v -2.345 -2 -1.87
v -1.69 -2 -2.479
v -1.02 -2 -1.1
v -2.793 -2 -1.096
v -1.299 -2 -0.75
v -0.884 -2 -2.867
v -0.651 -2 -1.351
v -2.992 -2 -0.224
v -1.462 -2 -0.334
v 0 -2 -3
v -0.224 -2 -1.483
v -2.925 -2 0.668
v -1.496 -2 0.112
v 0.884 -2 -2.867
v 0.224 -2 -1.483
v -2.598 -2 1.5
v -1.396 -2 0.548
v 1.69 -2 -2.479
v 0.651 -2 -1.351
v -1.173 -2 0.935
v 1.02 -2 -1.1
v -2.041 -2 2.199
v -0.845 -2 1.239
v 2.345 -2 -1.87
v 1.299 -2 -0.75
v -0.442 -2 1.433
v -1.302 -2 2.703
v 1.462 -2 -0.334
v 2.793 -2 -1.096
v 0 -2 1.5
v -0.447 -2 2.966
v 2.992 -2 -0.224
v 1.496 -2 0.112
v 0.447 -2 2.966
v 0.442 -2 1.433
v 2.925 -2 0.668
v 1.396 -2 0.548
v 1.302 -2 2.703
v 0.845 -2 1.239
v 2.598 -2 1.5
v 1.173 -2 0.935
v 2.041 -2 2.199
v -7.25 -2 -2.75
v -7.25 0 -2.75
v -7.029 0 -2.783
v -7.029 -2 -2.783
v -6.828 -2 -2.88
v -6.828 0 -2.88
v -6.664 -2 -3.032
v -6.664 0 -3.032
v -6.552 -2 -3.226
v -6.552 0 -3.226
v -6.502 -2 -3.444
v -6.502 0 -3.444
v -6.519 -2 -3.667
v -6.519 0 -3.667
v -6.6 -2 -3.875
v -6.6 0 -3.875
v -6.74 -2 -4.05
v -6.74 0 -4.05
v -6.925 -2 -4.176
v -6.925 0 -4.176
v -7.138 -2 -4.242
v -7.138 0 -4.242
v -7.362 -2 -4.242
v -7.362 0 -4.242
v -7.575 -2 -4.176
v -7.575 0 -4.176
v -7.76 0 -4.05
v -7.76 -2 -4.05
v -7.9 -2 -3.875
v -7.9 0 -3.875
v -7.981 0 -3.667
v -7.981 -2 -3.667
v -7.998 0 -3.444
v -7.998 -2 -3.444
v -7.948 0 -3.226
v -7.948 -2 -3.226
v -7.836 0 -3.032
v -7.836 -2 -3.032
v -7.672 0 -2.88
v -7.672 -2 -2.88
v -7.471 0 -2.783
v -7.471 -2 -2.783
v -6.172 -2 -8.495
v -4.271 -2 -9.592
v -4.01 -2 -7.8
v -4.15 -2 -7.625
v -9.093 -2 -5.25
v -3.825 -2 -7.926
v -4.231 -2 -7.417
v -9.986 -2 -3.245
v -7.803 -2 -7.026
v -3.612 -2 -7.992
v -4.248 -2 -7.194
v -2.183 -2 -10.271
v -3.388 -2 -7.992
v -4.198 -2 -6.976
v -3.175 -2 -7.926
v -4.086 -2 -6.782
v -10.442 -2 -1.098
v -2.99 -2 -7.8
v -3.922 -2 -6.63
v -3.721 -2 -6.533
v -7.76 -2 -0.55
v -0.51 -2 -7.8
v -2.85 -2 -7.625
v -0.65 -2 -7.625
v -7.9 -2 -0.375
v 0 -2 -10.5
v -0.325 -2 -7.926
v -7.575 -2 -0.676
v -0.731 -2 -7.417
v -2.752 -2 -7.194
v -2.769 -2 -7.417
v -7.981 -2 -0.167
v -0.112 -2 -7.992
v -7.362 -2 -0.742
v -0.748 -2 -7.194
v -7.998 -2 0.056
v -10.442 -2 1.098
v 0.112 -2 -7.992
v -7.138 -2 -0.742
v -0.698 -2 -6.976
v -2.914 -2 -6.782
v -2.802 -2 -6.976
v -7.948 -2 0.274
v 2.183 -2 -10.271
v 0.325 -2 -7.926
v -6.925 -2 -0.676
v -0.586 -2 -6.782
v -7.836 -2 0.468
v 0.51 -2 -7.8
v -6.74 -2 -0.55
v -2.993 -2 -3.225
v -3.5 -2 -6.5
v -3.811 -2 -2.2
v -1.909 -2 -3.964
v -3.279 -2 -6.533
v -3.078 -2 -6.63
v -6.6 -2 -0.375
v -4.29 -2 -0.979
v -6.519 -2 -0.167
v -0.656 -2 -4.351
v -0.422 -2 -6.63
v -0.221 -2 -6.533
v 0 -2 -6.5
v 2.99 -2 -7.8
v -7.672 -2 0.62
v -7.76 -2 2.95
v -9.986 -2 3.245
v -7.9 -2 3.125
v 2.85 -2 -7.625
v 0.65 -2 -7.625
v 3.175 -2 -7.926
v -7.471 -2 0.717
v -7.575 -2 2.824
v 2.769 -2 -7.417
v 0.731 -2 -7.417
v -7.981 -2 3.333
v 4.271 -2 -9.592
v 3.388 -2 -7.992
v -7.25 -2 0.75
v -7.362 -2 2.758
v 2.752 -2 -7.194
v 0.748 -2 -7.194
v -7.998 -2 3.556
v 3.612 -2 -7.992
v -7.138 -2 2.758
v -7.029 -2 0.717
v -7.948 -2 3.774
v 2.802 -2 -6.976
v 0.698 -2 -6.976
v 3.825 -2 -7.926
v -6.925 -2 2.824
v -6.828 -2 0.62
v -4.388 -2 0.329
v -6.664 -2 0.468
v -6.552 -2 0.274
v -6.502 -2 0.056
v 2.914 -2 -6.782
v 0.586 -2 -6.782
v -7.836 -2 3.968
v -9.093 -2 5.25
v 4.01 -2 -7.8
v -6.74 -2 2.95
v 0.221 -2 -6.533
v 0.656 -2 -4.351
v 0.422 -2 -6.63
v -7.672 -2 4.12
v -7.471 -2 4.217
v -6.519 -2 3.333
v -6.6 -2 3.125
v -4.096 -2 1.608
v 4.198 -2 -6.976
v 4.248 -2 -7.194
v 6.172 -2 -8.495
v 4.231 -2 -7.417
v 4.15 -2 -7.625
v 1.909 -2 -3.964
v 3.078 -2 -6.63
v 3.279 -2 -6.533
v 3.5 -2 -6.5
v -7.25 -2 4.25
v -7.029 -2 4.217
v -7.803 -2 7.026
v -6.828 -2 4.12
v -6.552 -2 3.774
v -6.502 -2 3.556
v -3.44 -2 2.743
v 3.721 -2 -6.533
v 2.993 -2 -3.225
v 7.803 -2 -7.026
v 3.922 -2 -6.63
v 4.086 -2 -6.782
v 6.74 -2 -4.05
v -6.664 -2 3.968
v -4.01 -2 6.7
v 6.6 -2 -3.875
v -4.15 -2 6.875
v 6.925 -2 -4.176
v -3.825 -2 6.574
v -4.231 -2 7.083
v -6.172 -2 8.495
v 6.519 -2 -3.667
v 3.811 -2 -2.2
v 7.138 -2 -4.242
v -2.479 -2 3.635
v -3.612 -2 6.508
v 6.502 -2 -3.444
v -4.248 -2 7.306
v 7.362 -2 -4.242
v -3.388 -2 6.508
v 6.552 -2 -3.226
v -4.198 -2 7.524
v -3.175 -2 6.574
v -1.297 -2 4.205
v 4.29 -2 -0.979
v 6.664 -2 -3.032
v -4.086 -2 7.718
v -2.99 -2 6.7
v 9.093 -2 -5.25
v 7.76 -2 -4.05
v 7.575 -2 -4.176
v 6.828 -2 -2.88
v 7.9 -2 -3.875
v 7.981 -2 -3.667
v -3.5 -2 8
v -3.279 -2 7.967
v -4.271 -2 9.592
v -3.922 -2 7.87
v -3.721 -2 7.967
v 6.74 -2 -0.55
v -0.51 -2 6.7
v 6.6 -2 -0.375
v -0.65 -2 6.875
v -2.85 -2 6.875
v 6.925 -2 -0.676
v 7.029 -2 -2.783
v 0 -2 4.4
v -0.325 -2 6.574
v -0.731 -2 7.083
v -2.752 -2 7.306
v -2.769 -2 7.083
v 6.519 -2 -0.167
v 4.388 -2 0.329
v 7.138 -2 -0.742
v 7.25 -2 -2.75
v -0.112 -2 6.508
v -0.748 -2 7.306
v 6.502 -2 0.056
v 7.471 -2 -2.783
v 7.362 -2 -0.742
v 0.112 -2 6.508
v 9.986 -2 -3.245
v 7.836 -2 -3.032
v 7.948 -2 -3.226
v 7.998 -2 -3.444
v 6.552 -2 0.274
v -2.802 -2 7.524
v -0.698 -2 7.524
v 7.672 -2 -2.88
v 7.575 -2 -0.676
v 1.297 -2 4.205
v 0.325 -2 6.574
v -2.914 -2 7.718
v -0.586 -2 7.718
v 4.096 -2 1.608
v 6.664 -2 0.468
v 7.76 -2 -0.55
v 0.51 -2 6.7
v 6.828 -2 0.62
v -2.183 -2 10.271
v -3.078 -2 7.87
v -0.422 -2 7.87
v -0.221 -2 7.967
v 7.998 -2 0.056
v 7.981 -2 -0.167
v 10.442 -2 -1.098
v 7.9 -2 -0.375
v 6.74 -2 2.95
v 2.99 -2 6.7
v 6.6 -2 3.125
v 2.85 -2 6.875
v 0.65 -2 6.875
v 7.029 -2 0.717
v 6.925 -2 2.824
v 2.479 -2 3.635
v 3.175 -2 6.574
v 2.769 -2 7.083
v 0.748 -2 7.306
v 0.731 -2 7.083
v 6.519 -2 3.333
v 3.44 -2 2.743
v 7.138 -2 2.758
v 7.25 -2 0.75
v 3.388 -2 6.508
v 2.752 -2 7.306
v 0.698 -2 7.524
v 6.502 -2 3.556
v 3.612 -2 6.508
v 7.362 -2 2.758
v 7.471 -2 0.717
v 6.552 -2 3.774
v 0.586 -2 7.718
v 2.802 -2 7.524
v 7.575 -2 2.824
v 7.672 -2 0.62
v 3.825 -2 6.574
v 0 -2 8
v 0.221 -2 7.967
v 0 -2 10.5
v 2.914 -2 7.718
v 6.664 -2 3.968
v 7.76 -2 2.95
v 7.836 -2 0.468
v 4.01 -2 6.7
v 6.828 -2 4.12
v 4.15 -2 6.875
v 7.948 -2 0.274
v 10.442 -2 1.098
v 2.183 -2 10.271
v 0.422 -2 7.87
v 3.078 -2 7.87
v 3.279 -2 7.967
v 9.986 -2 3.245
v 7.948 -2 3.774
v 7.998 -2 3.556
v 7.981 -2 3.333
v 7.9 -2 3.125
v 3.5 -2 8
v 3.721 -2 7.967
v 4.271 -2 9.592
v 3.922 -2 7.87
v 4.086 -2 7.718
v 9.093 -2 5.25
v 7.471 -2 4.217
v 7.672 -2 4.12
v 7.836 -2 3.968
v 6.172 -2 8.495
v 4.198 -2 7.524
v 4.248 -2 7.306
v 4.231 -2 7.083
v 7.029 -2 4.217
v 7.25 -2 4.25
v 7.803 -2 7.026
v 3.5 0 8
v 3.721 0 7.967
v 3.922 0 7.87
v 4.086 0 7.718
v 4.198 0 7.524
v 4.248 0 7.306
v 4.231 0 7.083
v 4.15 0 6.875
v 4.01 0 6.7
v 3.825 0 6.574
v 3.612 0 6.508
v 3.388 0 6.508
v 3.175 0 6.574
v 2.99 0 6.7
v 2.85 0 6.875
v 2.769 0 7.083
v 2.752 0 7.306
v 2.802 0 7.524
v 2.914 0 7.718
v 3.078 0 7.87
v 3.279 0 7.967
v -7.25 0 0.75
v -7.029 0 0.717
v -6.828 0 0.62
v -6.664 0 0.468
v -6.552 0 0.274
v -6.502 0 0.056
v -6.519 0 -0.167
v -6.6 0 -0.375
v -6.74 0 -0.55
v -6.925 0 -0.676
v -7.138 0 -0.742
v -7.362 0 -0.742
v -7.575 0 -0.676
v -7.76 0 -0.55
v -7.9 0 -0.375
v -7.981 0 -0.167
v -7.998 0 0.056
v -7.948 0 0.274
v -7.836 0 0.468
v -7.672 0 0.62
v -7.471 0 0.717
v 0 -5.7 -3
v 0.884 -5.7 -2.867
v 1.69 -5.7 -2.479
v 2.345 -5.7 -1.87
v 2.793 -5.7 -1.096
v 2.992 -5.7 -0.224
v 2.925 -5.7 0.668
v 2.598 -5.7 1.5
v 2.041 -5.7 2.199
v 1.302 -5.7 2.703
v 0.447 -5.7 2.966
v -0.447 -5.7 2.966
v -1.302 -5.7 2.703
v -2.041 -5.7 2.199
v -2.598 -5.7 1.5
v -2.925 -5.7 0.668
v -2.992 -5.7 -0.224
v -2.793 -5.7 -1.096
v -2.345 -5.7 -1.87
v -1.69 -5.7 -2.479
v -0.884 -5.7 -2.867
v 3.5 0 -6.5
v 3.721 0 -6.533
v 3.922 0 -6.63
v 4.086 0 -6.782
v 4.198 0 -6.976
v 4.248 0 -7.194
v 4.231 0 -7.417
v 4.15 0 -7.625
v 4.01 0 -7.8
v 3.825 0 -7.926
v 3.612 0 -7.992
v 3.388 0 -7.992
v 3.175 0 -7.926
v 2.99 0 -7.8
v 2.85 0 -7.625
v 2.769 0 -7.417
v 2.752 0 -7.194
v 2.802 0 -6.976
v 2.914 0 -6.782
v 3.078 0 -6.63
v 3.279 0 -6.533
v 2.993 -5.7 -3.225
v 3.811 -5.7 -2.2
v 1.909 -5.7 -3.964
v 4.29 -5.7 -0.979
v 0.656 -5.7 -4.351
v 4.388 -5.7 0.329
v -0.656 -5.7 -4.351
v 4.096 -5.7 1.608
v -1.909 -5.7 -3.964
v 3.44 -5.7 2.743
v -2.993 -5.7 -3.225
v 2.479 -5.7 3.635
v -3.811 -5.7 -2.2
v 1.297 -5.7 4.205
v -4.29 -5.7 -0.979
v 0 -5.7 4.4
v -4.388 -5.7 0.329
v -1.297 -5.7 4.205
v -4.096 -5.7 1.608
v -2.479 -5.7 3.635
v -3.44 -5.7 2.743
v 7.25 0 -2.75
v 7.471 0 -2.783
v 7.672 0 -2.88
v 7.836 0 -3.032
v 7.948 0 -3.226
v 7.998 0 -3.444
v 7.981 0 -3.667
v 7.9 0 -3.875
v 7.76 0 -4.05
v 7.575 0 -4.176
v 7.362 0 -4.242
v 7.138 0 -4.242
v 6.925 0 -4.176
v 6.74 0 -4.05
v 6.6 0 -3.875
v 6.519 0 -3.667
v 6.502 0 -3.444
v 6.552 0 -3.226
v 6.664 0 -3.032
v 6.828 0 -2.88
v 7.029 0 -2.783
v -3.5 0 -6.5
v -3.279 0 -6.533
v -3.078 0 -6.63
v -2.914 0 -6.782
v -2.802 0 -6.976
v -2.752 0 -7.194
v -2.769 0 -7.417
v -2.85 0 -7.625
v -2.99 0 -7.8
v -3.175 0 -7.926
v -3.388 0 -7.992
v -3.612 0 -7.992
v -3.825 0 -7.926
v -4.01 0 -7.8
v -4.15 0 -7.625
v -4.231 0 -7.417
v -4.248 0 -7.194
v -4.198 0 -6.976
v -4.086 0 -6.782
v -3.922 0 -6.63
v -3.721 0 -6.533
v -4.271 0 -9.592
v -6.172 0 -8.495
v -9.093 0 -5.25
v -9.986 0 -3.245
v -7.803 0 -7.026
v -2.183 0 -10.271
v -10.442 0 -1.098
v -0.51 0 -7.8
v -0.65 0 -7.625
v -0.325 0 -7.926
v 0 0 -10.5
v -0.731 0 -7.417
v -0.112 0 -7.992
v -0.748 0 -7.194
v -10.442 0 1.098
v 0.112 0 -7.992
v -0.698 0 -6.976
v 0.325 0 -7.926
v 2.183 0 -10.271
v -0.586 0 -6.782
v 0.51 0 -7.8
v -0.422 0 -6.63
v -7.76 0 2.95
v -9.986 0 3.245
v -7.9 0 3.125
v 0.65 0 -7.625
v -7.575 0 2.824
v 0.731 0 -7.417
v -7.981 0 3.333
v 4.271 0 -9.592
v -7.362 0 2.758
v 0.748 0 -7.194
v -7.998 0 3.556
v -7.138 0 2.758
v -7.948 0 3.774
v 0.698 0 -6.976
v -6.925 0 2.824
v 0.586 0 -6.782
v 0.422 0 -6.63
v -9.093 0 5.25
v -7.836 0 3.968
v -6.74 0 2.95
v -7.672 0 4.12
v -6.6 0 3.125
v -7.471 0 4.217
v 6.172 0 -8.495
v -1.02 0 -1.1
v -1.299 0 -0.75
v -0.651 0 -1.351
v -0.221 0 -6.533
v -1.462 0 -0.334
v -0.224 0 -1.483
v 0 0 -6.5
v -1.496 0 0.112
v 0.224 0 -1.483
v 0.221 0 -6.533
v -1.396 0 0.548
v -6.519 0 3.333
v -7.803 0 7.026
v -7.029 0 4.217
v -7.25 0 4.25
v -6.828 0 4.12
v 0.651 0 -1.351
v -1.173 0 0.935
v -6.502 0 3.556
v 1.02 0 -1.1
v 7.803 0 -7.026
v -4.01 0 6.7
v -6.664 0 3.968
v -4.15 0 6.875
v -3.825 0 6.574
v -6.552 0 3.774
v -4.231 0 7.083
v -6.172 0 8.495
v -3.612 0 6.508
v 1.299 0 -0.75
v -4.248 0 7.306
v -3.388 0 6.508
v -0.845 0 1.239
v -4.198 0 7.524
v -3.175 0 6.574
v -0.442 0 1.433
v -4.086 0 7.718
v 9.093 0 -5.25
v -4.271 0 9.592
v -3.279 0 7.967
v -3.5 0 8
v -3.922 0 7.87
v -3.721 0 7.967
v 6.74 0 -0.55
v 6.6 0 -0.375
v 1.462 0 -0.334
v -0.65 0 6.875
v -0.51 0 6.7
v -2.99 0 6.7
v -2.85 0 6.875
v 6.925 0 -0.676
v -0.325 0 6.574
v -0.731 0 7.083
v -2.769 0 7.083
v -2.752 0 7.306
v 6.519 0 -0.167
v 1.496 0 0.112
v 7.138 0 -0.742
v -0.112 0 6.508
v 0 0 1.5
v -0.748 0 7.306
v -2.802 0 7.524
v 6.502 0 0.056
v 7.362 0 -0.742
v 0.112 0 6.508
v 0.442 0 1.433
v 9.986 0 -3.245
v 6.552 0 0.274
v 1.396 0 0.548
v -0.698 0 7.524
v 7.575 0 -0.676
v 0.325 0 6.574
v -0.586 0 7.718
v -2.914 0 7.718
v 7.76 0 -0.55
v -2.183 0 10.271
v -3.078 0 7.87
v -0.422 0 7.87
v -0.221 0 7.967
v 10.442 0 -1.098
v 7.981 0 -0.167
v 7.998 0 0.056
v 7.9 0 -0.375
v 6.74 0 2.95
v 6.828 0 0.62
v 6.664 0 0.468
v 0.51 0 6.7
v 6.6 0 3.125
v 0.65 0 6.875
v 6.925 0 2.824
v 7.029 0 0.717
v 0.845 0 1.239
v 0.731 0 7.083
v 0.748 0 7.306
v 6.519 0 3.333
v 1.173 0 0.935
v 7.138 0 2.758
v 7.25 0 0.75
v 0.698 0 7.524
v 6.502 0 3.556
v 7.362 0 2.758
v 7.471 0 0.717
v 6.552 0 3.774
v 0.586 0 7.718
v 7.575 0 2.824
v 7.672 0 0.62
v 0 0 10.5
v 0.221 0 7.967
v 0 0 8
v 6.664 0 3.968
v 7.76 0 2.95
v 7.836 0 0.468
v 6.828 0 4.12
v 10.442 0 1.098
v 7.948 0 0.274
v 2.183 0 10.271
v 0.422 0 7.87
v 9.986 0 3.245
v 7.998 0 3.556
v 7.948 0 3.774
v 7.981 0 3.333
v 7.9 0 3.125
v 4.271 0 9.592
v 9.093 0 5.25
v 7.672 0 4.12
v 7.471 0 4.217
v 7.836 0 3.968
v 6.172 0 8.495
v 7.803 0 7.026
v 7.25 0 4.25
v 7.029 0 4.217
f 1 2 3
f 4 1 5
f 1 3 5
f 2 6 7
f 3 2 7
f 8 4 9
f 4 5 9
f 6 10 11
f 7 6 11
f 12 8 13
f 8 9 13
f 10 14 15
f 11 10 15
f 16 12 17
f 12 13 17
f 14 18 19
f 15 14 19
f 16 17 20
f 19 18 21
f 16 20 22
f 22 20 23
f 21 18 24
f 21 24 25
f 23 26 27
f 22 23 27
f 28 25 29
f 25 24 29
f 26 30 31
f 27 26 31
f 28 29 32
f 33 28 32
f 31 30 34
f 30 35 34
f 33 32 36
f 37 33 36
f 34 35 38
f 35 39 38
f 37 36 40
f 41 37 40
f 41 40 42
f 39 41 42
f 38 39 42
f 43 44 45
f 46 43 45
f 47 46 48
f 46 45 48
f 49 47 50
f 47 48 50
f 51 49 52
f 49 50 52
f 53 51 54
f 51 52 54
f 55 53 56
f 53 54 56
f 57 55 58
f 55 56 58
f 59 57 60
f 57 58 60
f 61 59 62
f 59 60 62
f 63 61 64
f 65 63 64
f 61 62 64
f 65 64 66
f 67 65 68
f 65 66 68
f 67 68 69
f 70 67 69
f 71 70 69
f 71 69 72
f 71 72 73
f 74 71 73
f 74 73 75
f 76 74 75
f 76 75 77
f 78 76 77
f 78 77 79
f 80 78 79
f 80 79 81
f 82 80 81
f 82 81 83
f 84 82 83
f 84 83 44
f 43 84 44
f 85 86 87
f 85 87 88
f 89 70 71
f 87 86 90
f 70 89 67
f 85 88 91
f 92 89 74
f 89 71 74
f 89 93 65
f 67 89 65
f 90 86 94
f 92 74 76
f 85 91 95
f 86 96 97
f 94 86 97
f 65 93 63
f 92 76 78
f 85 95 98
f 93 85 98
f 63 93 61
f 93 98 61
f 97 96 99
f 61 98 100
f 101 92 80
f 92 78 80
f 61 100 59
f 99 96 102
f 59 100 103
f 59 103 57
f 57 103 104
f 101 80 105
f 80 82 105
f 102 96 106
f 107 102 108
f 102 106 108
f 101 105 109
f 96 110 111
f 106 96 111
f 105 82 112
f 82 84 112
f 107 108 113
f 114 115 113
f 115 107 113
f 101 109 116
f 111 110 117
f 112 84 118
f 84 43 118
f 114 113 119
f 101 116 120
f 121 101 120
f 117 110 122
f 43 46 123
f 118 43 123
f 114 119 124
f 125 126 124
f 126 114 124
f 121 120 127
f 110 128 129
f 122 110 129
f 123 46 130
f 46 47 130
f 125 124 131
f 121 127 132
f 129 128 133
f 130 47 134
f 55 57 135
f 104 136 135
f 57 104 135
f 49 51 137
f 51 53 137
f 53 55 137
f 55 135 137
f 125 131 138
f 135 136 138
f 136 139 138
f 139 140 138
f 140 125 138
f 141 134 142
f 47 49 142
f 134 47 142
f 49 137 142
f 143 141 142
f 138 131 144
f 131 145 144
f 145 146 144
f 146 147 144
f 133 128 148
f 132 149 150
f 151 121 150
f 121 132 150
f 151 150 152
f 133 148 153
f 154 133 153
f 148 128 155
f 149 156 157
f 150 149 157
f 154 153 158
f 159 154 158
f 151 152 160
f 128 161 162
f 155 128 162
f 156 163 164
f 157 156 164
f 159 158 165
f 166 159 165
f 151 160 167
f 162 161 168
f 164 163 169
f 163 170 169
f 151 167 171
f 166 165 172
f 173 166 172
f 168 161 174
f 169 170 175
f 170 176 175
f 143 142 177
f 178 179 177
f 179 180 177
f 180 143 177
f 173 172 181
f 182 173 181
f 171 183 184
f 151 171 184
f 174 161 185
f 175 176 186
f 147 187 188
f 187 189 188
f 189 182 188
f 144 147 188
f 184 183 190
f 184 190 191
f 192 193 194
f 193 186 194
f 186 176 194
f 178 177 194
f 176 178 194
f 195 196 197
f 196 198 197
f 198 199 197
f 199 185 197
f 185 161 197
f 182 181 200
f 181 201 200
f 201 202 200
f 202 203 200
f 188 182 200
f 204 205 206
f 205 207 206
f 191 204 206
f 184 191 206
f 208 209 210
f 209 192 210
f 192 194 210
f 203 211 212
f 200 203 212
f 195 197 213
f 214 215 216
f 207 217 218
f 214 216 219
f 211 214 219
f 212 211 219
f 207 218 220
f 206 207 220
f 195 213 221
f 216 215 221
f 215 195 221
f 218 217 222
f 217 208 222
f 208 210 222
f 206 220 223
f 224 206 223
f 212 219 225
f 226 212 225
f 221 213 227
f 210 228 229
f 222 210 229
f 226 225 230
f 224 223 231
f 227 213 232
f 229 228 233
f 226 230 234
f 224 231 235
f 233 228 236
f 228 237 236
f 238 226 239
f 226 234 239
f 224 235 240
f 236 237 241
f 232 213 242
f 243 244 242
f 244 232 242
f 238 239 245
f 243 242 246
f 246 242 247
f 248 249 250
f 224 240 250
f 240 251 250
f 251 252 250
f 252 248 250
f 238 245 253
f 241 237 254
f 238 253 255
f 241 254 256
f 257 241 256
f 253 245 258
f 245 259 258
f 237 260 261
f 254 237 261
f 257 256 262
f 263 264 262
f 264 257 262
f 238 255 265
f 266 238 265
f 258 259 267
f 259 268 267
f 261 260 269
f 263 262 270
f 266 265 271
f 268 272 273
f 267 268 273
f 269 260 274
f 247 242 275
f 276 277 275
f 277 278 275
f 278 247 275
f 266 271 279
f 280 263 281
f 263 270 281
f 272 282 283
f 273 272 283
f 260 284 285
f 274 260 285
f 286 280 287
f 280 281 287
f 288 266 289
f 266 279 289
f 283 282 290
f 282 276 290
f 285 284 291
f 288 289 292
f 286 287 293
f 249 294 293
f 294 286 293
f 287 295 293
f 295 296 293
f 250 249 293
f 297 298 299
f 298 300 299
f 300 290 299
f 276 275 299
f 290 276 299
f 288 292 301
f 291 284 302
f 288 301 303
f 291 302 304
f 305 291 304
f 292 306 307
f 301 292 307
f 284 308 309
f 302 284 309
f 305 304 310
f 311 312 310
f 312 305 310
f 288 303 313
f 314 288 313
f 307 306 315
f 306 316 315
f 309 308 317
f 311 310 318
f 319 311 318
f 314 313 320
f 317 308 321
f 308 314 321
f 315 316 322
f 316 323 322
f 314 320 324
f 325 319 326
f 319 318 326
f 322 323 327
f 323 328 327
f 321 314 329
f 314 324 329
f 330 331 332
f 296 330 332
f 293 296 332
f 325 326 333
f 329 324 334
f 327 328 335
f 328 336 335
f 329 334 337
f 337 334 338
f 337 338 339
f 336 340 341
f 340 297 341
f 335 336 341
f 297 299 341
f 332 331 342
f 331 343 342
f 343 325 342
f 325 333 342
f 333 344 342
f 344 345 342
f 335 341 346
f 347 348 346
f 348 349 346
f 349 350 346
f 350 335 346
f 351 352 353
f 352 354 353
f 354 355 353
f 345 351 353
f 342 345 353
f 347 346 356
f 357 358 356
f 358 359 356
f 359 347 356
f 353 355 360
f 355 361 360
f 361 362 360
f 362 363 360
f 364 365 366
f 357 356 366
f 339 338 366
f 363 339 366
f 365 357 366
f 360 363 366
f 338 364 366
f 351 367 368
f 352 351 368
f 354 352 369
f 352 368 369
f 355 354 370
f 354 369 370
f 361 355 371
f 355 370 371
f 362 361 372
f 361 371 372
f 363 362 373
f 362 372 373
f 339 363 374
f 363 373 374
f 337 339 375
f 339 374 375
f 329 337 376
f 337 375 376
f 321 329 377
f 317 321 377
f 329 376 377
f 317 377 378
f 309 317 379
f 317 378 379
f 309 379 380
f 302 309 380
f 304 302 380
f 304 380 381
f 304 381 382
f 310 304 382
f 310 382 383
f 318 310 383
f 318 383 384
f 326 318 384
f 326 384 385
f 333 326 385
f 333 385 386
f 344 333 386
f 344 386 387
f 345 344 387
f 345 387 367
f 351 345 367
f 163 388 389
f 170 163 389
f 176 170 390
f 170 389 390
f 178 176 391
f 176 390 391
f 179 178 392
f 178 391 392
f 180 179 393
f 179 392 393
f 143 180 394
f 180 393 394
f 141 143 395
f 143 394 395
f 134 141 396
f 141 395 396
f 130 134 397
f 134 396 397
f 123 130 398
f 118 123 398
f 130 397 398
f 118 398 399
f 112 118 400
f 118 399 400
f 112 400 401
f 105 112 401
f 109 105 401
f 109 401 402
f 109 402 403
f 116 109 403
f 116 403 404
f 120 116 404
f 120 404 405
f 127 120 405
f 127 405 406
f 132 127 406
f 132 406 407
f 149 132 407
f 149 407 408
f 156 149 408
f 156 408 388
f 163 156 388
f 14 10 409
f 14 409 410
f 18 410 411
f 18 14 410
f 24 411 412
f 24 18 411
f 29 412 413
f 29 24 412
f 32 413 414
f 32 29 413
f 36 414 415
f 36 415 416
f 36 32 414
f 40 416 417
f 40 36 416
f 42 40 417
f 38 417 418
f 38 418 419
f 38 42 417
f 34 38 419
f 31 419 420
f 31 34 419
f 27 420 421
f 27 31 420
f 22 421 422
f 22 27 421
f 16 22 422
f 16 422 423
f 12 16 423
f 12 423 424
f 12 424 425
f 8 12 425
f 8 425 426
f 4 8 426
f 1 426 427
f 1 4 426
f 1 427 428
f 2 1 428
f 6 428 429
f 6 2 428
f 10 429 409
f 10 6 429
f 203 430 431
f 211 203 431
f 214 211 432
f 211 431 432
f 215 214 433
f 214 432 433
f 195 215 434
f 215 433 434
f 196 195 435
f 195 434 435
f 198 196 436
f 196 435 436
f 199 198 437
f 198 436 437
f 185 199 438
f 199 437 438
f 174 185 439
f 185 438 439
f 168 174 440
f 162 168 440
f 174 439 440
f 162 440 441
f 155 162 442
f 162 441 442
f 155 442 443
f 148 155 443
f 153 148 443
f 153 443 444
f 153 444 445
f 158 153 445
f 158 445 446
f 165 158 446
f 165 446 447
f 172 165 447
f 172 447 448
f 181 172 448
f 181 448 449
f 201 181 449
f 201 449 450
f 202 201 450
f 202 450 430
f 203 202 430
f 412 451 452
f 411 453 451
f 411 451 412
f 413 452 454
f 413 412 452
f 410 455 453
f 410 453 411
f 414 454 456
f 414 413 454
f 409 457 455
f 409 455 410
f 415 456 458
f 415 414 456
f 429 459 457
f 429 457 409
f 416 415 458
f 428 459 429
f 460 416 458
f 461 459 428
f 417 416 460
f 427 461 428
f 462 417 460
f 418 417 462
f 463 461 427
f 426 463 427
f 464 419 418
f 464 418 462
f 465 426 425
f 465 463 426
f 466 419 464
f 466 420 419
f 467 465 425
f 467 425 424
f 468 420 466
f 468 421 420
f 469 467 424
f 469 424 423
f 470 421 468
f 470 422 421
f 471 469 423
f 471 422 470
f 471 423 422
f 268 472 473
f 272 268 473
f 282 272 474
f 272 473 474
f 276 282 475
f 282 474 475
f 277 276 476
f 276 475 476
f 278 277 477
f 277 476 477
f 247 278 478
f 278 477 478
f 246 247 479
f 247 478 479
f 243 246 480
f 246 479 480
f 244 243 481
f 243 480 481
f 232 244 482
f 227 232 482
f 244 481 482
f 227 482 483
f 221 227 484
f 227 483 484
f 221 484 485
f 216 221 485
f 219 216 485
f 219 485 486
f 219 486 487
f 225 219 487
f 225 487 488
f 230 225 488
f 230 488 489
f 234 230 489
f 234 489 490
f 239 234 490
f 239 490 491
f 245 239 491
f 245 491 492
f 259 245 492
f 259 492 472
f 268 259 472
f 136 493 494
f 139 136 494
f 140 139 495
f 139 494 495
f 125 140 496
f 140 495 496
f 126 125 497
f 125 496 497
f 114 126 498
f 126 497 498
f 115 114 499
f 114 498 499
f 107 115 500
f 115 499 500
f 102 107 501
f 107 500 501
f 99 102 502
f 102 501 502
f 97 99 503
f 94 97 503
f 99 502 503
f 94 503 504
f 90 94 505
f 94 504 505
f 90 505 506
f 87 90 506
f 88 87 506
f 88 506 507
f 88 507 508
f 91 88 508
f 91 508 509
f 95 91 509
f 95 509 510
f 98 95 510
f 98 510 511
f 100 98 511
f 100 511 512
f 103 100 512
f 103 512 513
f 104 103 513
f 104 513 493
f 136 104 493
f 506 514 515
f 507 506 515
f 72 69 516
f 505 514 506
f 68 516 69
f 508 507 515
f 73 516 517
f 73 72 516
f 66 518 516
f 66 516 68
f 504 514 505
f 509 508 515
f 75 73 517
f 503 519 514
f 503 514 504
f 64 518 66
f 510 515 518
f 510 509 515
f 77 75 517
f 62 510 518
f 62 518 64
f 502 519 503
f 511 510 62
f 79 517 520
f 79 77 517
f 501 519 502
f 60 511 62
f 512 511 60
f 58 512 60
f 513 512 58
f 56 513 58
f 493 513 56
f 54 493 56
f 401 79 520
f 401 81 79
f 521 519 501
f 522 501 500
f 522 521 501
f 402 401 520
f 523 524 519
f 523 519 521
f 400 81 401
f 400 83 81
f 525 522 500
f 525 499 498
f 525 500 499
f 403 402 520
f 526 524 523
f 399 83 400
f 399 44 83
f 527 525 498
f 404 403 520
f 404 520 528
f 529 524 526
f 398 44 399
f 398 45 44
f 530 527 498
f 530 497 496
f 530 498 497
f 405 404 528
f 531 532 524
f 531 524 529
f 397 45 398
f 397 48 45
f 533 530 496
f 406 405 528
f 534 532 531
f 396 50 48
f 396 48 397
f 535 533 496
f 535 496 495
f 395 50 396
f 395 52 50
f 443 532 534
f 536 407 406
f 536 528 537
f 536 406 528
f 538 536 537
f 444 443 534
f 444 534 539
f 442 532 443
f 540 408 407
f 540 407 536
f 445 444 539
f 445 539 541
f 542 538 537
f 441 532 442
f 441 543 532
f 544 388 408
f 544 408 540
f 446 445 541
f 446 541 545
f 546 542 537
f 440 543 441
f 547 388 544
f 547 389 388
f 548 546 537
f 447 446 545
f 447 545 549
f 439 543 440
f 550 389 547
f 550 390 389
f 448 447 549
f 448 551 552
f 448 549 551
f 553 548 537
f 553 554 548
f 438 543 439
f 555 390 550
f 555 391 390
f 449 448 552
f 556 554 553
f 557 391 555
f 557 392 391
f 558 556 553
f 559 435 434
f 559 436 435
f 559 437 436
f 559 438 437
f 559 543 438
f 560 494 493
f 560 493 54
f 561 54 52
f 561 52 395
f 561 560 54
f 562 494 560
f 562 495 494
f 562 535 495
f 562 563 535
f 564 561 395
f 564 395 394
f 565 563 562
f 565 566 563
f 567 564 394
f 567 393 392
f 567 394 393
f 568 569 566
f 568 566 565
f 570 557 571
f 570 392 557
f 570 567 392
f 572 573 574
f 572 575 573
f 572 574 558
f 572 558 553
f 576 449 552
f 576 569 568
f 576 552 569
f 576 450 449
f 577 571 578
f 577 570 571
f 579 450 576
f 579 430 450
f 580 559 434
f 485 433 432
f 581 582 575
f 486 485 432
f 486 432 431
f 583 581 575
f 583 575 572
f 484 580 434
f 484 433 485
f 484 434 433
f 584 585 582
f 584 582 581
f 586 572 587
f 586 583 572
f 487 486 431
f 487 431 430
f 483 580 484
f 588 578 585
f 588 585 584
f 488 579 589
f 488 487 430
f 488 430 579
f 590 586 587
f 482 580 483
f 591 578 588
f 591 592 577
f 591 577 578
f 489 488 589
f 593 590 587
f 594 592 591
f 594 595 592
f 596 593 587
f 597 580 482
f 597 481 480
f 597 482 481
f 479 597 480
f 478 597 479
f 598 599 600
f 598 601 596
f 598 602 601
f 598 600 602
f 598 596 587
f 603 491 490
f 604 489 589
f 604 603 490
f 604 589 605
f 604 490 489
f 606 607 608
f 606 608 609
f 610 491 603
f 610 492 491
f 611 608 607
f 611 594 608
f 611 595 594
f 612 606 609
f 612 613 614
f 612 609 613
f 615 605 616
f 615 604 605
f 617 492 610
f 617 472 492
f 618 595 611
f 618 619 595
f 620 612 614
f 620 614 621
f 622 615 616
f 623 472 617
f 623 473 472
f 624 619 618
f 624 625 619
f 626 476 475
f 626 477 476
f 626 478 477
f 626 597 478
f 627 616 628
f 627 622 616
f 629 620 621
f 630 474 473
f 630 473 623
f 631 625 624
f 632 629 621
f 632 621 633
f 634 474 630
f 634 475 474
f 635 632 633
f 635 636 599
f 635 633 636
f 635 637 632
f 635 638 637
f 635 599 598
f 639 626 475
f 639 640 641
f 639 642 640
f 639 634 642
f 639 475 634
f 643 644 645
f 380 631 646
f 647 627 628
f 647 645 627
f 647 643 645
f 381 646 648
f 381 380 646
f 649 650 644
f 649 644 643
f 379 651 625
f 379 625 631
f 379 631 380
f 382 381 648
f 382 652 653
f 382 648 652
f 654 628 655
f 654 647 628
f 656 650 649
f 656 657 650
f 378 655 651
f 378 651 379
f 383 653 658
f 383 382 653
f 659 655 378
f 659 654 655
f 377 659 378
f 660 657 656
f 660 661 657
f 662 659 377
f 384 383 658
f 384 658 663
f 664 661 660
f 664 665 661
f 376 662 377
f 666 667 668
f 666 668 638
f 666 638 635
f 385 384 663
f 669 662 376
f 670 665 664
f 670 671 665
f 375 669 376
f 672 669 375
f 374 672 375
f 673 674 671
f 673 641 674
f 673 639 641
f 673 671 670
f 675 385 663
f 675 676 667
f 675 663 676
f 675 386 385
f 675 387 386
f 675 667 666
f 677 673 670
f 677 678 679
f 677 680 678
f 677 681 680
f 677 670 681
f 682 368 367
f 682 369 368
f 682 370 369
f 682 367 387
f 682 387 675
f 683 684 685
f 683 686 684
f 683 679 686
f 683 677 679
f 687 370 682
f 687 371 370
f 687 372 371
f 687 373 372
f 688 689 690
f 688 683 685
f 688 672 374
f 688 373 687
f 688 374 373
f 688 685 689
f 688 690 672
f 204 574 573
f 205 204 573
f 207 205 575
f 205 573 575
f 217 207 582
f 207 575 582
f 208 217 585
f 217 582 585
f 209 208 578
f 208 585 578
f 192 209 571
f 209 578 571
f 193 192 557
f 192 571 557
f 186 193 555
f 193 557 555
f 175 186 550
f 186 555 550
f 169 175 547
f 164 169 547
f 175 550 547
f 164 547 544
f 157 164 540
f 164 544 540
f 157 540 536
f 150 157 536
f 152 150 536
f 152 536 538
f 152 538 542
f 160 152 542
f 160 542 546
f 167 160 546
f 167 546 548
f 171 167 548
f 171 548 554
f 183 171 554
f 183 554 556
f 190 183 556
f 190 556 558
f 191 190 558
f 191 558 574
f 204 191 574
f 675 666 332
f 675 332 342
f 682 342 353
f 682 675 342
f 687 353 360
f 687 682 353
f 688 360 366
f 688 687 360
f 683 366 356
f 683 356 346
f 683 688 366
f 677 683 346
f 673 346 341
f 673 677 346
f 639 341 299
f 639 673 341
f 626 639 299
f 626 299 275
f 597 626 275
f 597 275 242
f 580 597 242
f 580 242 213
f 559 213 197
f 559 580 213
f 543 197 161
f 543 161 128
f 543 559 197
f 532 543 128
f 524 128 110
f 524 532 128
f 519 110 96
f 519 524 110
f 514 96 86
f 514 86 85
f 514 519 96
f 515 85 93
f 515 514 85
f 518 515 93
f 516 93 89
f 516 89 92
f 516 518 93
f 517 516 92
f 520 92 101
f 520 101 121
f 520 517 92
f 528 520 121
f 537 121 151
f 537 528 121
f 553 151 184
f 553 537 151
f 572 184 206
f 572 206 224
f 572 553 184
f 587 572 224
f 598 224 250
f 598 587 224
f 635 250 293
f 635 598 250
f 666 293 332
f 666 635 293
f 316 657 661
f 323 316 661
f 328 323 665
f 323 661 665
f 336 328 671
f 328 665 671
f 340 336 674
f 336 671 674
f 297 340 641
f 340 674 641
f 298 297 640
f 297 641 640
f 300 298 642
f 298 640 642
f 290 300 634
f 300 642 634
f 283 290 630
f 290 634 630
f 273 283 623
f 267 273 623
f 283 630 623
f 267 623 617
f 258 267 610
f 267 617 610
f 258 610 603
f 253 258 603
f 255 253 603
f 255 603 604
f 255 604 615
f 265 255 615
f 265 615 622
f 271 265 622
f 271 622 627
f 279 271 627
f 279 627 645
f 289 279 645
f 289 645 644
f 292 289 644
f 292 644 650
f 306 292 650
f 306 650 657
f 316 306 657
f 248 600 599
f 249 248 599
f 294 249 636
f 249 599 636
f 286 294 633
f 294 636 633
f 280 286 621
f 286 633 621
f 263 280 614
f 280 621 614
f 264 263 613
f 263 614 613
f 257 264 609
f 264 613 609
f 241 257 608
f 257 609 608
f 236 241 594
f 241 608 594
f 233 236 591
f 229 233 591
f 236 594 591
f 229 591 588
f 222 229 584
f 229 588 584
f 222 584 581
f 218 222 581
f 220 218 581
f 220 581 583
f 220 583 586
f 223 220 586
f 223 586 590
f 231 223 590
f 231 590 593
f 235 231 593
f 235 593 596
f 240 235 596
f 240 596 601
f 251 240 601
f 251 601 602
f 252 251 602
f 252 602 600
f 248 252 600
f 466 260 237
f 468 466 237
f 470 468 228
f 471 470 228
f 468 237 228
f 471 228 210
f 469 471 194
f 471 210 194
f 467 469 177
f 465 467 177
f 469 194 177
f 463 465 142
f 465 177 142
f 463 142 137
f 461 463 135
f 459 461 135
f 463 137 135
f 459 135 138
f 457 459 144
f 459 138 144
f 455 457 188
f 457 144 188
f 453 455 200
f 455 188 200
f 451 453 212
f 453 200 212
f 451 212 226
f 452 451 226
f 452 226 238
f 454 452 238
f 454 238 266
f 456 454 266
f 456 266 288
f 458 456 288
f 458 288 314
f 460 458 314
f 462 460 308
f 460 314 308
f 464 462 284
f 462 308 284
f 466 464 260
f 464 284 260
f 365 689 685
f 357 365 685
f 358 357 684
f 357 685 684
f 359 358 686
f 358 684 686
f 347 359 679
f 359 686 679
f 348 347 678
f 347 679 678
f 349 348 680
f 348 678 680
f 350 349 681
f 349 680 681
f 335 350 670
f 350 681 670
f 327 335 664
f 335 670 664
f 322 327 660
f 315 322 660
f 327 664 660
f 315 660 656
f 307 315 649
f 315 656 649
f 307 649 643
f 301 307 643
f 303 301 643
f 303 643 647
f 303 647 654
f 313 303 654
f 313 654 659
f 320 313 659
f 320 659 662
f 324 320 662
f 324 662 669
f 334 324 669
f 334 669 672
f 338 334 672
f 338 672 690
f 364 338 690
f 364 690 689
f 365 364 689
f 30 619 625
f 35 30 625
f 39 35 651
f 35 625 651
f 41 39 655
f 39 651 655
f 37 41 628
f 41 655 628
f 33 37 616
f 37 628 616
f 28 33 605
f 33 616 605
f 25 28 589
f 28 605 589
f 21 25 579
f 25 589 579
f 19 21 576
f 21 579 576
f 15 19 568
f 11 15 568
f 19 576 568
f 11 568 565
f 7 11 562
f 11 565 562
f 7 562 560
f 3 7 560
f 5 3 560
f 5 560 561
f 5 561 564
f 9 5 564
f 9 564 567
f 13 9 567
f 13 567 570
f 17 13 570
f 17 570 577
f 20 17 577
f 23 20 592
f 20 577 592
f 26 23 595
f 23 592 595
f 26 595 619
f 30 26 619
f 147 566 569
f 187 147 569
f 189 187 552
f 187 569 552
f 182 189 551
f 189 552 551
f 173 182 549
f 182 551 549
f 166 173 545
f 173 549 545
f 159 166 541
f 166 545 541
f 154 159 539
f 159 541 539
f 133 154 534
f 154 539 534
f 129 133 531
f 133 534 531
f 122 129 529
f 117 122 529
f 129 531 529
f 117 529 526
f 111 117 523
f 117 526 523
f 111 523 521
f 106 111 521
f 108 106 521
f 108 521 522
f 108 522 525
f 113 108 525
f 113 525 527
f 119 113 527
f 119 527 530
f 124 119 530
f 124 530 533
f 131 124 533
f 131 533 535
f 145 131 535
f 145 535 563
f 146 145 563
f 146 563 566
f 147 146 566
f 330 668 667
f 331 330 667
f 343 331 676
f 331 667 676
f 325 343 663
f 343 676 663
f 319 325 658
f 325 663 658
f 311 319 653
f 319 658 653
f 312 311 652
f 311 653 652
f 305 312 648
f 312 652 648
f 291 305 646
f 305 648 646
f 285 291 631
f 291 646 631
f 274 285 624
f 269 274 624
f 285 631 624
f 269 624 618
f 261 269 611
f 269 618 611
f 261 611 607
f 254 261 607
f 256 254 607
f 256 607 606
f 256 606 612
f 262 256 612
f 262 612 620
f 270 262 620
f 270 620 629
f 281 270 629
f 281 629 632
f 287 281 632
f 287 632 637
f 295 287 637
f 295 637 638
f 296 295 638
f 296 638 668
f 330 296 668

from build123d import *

# Parameters (mm, degrees)
SKETCH1_R           = 10.5
SKETCH1_R_2         = 1.5
BOSS_EXTRUDE1_DEPTH = 2
SKETCH2_R           = 4.4
SKETCH2_R_2         = 3
BOSS_EXTRUDE2_DEPTH = 3.7
SKETCH3_R           = 0.75
CUT_EXTRUDE1_DEPTH  = 10


with BuildPart() as part:
    # Sketch1 → Boss-Extrude1 (new body)
    with BuildSketch(Plane(origin=(0, 0, 0), x_dir=(1, 0, 0), z_dir=(0, 1, 0))):
        with Locations(Location((0, 0, 0), (0, 0, 270))):
            Circle(SKETCH1_R)
        with Locations(Location((0, 0, 0), (0, 0, 270))):
            Circle(SKETCH1_R_2, mode=Mode.SUBTRACT)
    extrude(amount=-BOSS_EXTRUDE1_DEPTH)

    # Sketch2 → Boss-Extrude2 (add)
    with BuildSketch(Plane.XZ.offset(2)):
        with Locations(Location((0, 0, 0), (0, 0, 90))):
            Circle(SKETCH2_R)
        with Locations(Location((0, 0, 0), (0, 0, 270))):
            Circle(SKETCH2_R_2, mode=Mode.SUBTRACT)
    extrude(amount=BOSS_EXTRUDE2_DEPTH)

    # Sketch3 → Cut-Extrude1 (cut)
    with BuildSketch(Plane(origin=(0, 0, 0), x_dir=(1, 0, 0), z_dir=(0, 1, 0))):
        with Locations(Location((0, 7.25, 0), (0, 0, 270))):
            Circle(SKETCH3_R)
        with Locations(Location((3.5, 7.25, 0), (0, 0, 270))):
            Circle(SKETCH3_R)
        with Locations(Location((-3.5, 7.25, 0), (0, 0, 270))):
            Circle(SKETCH3_R)
        with Locations(Location((-7.25, 3.5, 0), (0, 0, 270))):
            Circle(SKETCH3_R)
        with Locations(Location((-7.25, -3.5, 0), (0, 0, 270))):
            Circle(SKETCH3_R)
        with Locations(Location((-7.25, 0, 0), (0, 0, 270))):
            Circle(SKETCH3_R)
        with Locations(Location((7.25, -3.5, 0), (0, 0, 270))):
            Circle(SKETCH3_R)
        with Locations(Location((7.25, 3.5, 0), (0, 0, 270))):
            Circle(SKETCH3_R)
        with Locations(Location((7.25, 0, 0), (0, 0, 270))):
            Circle(SKETCH3_R)
        with Locations(Location((0, -7.25, 0), (0, 0, 270))):
            Circle(SKETCH3_R)
        with Locations(Location((-3.5, -7.25, 0), (0, 0, 270))):
            Circle(SKETCH3_R)
        with Locations(Location((3.5, -7.25, 0), (0, 0, 270))):
            Circle(SKETCH3_R)
    extrude(amount=-CUT_EXTRUDE1_DEPTH, mode=Mode.SUBTRACT)


solid = part.part
